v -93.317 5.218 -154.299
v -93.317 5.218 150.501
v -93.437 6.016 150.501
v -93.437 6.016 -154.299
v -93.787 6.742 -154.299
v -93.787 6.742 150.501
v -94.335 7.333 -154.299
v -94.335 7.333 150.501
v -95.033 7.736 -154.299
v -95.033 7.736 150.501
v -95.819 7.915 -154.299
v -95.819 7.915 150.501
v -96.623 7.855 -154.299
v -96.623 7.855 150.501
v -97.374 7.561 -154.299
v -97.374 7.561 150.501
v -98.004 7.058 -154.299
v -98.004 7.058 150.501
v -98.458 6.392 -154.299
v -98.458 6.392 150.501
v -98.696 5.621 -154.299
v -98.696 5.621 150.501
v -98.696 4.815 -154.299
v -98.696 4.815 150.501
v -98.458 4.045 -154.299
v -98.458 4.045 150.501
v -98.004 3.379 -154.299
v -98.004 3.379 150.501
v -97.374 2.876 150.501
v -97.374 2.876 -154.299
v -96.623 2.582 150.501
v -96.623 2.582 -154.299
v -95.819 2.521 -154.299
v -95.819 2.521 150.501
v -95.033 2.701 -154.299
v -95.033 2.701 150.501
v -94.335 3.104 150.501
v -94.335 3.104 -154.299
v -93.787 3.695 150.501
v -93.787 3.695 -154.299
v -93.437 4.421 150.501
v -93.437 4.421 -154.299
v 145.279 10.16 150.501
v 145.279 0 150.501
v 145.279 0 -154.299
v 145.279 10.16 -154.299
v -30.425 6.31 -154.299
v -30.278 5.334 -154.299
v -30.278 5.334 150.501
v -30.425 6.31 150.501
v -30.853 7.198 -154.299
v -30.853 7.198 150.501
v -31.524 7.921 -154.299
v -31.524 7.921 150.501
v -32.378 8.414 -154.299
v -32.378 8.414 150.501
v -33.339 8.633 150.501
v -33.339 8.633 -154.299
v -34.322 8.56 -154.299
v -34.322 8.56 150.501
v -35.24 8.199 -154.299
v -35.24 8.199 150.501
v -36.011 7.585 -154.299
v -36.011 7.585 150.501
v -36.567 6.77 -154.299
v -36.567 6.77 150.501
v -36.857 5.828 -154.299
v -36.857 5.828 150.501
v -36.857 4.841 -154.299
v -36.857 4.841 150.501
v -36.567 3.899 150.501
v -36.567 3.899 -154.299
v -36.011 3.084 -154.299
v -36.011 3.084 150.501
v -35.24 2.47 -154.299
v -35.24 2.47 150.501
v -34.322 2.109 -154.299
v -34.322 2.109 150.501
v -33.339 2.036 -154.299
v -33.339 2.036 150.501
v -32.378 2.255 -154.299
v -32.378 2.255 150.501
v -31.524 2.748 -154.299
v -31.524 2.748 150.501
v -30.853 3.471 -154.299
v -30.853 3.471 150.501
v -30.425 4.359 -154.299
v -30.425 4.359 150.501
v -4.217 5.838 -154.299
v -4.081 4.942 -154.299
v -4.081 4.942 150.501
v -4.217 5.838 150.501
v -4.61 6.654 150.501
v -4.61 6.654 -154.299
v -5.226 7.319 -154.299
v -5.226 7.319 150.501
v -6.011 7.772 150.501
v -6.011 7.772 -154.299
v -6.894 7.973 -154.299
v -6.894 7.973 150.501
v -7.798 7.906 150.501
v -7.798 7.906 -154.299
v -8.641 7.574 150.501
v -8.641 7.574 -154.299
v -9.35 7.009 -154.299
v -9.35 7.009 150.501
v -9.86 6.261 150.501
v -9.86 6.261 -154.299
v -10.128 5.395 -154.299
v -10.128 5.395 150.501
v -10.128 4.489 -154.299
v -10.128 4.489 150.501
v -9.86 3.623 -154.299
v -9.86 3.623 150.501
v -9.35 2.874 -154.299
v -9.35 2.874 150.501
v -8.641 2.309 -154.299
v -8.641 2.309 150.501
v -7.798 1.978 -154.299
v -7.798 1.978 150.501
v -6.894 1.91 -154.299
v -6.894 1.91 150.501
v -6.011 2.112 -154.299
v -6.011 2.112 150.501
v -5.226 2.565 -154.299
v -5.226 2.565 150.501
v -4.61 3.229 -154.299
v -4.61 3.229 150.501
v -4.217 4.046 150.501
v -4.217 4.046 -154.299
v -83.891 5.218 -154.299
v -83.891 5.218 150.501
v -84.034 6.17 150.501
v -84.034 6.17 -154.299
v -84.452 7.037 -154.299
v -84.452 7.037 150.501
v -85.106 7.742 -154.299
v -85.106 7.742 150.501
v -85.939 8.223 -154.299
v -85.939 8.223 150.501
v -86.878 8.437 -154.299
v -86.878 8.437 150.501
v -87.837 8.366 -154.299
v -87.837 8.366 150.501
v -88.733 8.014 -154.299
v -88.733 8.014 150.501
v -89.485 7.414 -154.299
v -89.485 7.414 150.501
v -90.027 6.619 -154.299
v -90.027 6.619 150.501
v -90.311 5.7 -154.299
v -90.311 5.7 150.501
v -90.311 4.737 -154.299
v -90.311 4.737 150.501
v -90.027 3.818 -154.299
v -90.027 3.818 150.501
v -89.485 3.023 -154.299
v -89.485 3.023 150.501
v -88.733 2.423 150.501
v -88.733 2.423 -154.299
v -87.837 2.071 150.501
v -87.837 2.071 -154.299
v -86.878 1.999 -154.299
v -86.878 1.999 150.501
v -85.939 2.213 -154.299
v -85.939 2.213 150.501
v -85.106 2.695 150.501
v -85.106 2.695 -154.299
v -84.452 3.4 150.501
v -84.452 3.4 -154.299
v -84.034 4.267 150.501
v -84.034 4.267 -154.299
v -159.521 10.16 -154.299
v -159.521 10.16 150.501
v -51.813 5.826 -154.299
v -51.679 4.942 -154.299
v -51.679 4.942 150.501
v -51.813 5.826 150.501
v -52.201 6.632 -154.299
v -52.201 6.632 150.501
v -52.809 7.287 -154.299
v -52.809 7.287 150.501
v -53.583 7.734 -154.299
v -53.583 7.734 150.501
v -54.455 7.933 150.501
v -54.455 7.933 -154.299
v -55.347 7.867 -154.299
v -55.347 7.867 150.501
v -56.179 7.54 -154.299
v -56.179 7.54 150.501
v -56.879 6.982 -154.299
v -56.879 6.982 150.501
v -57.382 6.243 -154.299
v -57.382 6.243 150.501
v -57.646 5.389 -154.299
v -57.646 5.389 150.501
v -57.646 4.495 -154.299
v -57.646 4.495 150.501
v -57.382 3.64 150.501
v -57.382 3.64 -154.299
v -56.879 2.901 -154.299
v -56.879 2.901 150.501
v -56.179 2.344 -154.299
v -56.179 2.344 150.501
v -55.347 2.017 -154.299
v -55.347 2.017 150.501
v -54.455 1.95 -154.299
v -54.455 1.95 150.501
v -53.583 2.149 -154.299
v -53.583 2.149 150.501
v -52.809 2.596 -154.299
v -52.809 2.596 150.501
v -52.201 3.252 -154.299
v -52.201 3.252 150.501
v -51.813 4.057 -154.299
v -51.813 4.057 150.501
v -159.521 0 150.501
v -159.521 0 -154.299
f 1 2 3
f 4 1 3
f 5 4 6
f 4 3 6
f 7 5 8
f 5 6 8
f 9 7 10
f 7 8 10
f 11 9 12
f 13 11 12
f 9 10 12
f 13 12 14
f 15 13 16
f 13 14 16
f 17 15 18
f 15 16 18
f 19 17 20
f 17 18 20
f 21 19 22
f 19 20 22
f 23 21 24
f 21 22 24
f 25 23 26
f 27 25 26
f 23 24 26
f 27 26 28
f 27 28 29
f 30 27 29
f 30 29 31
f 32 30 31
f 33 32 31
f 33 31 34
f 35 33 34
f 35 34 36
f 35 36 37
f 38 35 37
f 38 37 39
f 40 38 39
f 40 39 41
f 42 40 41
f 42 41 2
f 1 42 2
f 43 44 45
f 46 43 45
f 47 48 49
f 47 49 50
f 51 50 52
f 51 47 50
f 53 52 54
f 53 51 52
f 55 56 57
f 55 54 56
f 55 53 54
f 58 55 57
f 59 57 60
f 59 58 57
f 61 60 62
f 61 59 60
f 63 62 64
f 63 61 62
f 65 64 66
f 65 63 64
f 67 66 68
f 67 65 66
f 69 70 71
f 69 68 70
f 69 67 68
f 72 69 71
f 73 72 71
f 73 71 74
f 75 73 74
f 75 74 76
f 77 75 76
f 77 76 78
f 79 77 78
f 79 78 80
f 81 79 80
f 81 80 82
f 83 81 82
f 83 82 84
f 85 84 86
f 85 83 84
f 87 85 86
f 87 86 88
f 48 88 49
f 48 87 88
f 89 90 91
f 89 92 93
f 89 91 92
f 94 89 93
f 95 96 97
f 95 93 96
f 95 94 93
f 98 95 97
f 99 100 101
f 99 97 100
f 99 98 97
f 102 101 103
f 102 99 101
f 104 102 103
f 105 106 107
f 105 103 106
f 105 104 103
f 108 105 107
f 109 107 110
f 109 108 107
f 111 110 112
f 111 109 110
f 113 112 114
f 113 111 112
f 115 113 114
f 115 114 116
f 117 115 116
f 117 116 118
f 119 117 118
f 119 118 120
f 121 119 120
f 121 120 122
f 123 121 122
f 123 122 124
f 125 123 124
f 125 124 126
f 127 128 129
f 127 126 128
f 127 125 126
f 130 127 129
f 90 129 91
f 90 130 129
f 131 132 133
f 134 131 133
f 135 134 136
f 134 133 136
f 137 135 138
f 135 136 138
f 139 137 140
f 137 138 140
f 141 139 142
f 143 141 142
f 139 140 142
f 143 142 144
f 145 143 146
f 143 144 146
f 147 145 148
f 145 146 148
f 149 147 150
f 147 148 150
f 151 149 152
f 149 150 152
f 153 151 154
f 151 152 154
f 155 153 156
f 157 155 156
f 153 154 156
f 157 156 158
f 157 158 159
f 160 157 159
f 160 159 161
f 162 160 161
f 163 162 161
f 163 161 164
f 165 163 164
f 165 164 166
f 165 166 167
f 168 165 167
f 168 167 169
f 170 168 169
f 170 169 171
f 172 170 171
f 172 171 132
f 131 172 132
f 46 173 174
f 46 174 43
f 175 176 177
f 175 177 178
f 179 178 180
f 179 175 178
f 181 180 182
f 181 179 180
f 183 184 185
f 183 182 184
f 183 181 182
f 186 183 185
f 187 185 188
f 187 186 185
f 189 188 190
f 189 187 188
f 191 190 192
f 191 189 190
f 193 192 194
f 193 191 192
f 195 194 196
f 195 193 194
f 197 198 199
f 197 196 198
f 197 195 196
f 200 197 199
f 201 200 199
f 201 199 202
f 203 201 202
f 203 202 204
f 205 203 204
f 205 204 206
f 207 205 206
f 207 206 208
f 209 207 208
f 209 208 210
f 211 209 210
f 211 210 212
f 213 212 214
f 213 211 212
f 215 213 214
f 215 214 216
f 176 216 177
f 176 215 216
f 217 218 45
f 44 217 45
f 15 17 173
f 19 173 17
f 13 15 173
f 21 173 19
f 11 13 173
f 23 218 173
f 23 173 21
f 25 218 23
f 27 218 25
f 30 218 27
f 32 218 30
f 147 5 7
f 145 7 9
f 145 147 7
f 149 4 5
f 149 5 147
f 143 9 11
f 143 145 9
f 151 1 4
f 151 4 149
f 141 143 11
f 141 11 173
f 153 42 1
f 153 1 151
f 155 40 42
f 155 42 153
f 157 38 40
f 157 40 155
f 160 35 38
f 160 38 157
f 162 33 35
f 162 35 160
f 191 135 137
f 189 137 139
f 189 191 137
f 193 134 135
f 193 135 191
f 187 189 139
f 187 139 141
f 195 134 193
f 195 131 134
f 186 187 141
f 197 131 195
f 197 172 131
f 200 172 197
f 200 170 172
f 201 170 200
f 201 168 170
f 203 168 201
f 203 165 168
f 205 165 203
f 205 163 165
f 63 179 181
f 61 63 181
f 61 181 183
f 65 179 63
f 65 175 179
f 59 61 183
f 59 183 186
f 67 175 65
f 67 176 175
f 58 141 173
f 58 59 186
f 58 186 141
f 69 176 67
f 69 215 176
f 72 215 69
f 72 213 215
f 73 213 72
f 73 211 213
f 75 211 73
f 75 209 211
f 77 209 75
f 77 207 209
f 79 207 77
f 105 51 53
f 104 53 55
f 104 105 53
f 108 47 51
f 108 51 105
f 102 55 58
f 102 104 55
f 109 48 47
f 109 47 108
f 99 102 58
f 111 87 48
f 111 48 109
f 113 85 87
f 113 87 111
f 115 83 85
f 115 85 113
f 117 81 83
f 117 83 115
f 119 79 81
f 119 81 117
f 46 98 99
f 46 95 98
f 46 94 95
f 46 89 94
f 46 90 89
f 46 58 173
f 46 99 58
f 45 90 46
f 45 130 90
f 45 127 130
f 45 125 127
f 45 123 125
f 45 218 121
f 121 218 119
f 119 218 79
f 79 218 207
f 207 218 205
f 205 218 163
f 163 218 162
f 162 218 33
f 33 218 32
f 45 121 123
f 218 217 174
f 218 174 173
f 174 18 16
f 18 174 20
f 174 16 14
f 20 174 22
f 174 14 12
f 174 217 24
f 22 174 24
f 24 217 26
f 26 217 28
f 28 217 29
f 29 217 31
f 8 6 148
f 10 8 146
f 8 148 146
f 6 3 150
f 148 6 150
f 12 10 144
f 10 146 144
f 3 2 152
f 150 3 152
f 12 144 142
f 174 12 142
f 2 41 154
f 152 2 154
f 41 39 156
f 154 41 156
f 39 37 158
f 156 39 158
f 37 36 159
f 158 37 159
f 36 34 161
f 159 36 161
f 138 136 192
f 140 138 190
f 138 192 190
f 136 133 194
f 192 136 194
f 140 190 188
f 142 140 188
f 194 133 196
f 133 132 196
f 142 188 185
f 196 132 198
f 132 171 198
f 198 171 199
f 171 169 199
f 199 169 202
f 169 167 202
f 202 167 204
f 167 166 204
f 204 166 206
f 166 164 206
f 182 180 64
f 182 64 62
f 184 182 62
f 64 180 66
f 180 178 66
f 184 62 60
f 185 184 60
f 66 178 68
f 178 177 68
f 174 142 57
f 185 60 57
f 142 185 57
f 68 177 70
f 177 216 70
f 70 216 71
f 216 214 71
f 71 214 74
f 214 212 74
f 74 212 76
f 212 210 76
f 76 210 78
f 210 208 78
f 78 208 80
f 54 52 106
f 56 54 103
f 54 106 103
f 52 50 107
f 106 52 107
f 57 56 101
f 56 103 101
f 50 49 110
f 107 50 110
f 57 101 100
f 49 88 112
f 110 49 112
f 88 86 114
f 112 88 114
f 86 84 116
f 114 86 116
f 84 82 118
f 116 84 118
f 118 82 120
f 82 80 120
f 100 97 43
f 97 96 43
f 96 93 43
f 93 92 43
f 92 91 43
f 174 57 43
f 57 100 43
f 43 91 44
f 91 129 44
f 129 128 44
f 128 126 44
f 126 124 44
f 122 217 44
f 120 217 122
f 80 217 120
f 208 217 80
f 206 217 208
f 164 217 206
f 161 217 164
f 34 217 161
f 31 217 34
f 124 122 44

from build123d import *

# Parameters (mm, degrees)
SKETCH1_W               = 304.8
SKETCH1_H               = 304.8
BOSS_EXTRUDE1_DEPTH     = 10.16
CUT_EXTRUDE1_DEPTH      = 223.167807436
CUT_EXTRUDE1_DEPTH_BACK = 223.167807436
SKETCH2_R               = 3.04
SKETCH4_R               = 3.2281005
CUT_EXTRUDE3_DEPTH      = 345.170558112
CUT_EXTRUDE4_DEPTH      = 345.170558112
CUT_EXTRUDE4_DEPTH_BACK = 345.170558112
SKETCH5_R               = 3.308101134
CUT_EXTRUDE5_DEPTH      = 345.170558112
CUT_EXTRUDE5_DEPTH_BACK = 345.170558112
SKETCH3_R               = 3
SKETCH6_R               = 2.704571709
CUT_EXTRUDE6_DEPTH      = 345.170558112


with BuildPart() as part:
    # Sketch1 → Boss-Extrude1 (new body)
    with BuildSketch(Plane(origin=(0, 0, 0), x_dir=(1, 0, 0), z_dir=(0, 1, 0))):
        with Locations((-7.121495327, 1.899065421)):
            Rectangle(SKETCH1_W, SKETCH1_H)
    extrude(amount=BOSS_EXTRUDE1_DEPTH)

    # Sketch2 → Cut-Extrude1 (cut, two sides: drawn at the far end of the back side and taken through both)
    with BuildSketch(Plane.XY.offset(-CUT_EXTRUDE1_DEPTH_BACK)):
        with Locations((-7.121495327, 4.941750029)):
            Circle(SKETCH2_R)
    extrude(amount=CUT_EXTRUDE1_DEPTH + CUT_EXTRUDE1_DEPTH_BACK, mode=Mode.SUBTRACT)

    # Sketch4 → Cut-Extrude3 (cut, through all)
    with BuildSketch(Plane.XY.offset(150.500934579)):
        with Locations((-87.118814918, 5.218403667)):
            Circle(SKETCH4_R)
    extrude(amount=-CUT_EXTRUDE3_DEPTH, mode=Mode.SUBTRACT)

    # Sketch5 → Cut-Extrude4 (cut, two sides: drawn at the far end of the back side and taken through both)
    with BuildSketch(Plane.XY.offset(150.500934579).offset(-CUT_EXTRUDE4_DEPTH_BACK)):
        with Locations((-33.586304402, 5.334469318)):
            Circle(SKETCH5_R)
    extrude(amount=CUT_EXTRUDE4_DEPTH + CUT_EXTRUDE4_DEPTH_BACK, mode=Mode.SUBTRACT)

    # Sketch3 → Cut-Extrude5 (cut, two sides: drawn at the far end of the back side and taken through both)
    with BuildSketch(Plane.XY.offset(150.500934579).offset(-CUT_EXTRUDE5_DEPTH_BACK)):
        with Locations((-54.67948523, 4.941750029)):
            Circle(SKETCH3_R)
    extrude(amount=CUT_EXTRUDE5_DEPTH + CUT_EXTRUDE5_DEPTH_BACK, mode=Mode.SUBTRACT)

    # Sketch6 → Cut-Extrude6 (cut, through all)
    with BuildSketch(Plane.XY.offset(150.500934579)):
        with Locations((-96.021495327, 5.218403667)):
            Circle(SKETCH6_R)
    extrude(amount=-CUT_EXTRUDE6_DEPTH, mode=Mode.SUBTRACT)


solid = part.part
